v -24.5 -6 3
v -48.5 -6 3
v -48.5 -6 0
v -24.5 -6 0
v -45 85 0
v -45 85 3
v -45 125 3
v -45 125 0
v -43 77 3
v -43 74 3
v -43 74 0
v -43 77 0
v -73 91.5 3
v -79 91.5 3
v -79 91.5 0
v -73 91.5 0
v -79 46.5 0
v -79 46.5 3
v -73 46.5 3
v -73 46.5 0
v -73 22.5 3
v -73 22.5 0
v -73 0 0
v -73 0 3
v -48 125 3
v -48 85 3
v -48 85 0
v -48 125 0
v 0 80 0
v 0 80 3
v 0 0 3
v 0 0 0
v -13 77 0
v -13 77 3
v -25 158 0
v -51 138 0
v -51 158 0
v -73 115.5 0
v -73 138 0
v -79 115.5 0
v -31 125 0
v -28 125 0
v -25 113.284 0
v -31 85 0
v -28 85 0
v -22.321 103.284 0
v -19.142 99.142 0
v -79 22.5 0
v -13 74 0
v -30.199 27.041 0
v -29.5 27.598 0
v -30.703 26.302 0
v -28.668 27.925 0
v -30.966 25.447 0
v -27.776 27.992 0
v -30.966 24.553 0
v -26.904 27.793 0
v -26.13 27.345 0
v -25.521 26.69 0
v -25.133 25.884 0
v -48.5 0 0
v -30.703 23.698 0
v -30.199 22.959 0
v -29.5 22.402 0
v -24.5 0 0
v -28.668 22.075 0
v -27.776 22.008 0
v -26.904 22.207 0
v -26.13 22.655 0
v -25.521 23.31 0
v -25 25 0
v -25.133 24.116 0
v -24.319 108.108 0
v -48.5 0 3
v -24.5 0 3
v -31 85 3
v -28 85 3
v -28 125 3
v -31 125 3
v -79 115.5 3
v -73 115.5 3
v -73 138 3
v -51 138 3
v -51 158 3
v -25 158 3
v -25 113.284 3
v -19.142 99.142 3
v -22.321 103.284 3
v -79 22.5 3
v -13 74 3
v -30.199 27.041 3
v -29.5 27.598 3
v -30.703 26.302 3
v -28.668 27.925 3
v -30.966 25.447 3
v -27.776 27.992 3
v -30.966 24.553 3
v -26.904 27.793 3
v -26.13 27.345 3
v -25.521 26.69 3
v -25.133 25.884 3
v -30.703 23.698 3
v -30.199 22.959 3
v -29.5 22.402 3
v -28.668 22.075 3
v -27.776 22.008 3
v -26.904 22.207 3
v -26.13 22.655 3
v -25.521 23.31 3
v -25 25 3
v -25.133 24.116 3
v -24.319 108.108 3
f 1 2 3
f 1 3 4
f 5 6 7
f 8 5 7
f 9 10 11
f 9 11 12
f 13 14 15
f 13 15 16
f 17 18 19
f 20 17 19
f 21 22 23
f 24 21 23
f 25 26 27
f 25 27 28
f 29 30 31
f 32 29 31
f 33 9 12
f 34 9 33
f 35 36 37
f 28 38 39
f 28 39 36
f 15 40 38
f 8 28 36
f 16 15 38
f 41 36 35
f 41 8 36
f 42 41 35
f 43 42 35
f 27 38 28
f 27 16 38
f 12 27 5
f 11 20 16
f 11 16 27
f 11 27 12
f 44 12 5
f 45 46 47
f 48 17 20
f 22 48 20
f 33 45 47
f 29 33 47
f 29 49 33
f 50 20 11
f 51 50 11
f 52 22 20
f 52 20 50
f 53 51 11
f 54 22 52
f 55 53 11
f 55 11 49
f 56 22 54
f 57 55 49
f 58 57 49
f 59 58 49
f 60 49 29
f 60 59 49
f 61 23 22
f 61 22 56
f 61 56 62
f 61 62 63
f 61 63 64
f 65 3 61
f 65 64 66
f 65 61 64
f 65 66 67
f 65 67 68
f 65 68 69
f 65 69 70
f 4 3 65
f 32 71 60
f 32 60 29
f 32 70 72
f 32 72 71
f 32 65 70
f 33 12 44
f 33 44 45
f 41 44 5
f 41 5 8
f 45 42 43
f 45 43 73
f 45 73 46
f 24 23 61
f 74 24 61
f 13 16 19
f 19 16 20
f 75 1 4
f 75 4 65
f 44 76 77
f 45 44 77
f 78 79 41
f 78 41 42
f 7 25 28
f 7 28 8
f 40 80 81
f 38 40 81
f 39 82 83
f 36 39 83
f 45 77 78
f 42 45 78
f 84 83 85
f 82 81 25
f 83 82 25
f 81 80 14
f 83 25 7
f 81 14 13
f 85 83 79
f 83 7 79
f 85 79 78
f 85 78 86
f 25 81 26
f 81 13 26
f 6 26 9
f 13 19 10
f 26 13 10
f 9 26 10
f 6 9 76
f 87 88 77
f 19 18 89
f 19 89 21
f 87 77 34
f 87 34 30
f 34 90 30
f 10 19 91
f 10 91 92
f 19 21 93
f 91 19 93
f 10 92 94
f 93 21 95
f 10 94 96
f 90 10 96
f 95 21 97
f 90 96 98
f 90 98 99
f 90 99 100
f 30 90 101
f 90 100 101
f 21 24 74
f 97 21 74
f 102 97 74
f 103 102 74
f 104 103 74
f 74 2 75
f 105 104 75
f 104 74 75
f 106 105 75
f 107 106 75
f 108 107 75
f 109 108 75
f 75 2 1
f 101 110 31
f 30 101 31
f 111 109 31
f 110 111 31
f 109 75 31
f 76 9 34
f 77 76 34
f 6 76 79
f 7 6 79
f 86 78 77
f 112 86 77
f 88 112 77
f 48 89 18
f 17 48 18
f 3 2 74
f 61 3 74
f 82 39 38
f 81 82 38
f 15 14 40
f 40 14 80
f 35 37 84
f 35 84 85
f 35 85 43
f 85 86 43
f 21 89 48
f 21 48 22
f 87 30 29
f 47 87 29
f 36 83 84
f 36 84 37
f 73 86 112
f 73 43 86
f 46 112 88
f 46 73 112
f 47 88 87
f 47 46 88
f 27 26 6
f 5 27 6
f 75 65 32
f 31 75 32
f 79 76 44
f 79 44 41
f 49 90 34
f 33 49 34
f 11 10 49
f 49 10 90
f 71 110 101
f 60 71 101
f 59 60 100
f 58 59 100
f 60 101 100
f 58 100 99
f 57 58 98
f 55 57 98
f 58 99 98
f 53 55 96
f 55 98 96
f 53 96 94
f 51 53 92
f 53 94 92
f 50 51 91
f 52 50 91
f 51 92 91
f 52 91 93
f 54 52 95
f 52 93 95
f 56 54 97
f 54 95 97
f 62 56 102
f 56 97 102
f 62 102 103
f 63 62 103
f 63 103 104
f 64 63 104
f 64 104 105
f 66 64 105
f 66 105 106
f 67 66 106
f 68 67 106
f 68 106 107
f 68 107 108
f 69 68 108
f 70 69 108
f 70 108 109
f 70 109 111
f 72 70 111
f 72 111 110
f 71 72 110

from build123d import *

# Parameters (mm, degrees)
BASESHAPE_DEPTH   = 3
SKETCH2_R         = 3
SHAFTHOLES_DEPTH  = 157.147366292
SKETCH4_W         = 6
SKETCH4_H         = 24
SKETCH4_W_2       = 24
SKETCH4_H_2       = 6
FINGERS_DEPTH     = 3
SKETCH5_W         = 30
SKETCH5_H         = 3
SKETCH5_W_2       = 3
SKETCH5_H_2       = 40
GROOVES_DEPTH     = 160.040875249
CHAMFER1_SIZE     = 25
FILLET2_R         = 20
SKETCH6_W         = 26
SKETCH6_H         = 3
MARBLECHUTE_DEPTH = 20


with BuildPart() as part:
    # Sketch1 → BaseShape (new body)
    with BuildSketch(Plane.XY):
        Polygon((-73, 138), (-73, 0), (0, 0), (0, 77), (-31, 77), (-31, 138), align=None)
    extrude(amount=BASESHAPE_DEPTH)

    # Sketch2 → ShaftHoles (cut, through all)
    with BuildSketch(Plane.XY.offset(3)):
        with Locations((-28, 25)):
            Circle(SKETCH2_R)
    extrude(amount=-SHAFTHOLES_DEPTH, mode=Mode.SUBTRACT)

    # Sketch4 → Fingers (add)
    with BuildSketch(Plane.XY.offset(3)):
        Polygon((0, 77), (-31, 77), (-31, 80), (-31, 138), (-25, 138), (-25, 80), (0, 80), align=None)
        with Locations((-76, 103.5)):
            Rectangle(SKETCH4_W, SKETCH4_H)
        with Locations((-76, 34.5)):
            Rectangle(SKETCH4_W, SKETCH4_H)
        with Locations((-36.5, -3)):
            Rectangle(SKETCH4_W_2, SKETCH4_H_2)
    extrude(amount=-FINGERS_DEPTH)

    # Sketch5 → Grooves (cut, through all)
    with BuildSketch(Plane.XY.offset(3)):
        with Locations((-28, 75.5)):
            Rectangle(SKETCH5_W, SKETCH5_H)
        with Locations((-46.5, 105)):
            Rectangle(SKETCH5_W_2, SKETCH5_H_2)
        with Locations((-29.5, 105)):
            Rectangle(SKETCH5_W_2, SKETCH5_H_2)
    extrude(amount=-GROOVES_DEPTH, mode=Mode.SUBTRACT)

    # Chamfer1
    chamfer1_edges = [part.edges().sort_by_distance(p)[0] for p in [
        (-25, 80, 1.5),
    ]]
    chamfer(chamfer1_edges, length=CHAMFER1_SIZE - 0.0001)  # a hair under: the kernel refuses the full size

    # Fillet2
    fillet2_edges = [part.edges().sort_by_distance(p)[0] for p in [
        (-25, 104.9999, 1.5),
    ]]
    fillet(fillet2_edges, radius=FILLET2_R)

    # Sketch6 → MarbleChute (add)
    with BuildSketch(Plane(origin=(0, 138, 0), x_dir=(1, 0, 0), z_dir=(0, 1, 0))):
        with Locations((-38, -1.5)):
            Rectangle(SKETCH6_W, SKETCH6_H)
    extrude(amount=MARBLECHUTE_DEPTH)


solid = part.part
